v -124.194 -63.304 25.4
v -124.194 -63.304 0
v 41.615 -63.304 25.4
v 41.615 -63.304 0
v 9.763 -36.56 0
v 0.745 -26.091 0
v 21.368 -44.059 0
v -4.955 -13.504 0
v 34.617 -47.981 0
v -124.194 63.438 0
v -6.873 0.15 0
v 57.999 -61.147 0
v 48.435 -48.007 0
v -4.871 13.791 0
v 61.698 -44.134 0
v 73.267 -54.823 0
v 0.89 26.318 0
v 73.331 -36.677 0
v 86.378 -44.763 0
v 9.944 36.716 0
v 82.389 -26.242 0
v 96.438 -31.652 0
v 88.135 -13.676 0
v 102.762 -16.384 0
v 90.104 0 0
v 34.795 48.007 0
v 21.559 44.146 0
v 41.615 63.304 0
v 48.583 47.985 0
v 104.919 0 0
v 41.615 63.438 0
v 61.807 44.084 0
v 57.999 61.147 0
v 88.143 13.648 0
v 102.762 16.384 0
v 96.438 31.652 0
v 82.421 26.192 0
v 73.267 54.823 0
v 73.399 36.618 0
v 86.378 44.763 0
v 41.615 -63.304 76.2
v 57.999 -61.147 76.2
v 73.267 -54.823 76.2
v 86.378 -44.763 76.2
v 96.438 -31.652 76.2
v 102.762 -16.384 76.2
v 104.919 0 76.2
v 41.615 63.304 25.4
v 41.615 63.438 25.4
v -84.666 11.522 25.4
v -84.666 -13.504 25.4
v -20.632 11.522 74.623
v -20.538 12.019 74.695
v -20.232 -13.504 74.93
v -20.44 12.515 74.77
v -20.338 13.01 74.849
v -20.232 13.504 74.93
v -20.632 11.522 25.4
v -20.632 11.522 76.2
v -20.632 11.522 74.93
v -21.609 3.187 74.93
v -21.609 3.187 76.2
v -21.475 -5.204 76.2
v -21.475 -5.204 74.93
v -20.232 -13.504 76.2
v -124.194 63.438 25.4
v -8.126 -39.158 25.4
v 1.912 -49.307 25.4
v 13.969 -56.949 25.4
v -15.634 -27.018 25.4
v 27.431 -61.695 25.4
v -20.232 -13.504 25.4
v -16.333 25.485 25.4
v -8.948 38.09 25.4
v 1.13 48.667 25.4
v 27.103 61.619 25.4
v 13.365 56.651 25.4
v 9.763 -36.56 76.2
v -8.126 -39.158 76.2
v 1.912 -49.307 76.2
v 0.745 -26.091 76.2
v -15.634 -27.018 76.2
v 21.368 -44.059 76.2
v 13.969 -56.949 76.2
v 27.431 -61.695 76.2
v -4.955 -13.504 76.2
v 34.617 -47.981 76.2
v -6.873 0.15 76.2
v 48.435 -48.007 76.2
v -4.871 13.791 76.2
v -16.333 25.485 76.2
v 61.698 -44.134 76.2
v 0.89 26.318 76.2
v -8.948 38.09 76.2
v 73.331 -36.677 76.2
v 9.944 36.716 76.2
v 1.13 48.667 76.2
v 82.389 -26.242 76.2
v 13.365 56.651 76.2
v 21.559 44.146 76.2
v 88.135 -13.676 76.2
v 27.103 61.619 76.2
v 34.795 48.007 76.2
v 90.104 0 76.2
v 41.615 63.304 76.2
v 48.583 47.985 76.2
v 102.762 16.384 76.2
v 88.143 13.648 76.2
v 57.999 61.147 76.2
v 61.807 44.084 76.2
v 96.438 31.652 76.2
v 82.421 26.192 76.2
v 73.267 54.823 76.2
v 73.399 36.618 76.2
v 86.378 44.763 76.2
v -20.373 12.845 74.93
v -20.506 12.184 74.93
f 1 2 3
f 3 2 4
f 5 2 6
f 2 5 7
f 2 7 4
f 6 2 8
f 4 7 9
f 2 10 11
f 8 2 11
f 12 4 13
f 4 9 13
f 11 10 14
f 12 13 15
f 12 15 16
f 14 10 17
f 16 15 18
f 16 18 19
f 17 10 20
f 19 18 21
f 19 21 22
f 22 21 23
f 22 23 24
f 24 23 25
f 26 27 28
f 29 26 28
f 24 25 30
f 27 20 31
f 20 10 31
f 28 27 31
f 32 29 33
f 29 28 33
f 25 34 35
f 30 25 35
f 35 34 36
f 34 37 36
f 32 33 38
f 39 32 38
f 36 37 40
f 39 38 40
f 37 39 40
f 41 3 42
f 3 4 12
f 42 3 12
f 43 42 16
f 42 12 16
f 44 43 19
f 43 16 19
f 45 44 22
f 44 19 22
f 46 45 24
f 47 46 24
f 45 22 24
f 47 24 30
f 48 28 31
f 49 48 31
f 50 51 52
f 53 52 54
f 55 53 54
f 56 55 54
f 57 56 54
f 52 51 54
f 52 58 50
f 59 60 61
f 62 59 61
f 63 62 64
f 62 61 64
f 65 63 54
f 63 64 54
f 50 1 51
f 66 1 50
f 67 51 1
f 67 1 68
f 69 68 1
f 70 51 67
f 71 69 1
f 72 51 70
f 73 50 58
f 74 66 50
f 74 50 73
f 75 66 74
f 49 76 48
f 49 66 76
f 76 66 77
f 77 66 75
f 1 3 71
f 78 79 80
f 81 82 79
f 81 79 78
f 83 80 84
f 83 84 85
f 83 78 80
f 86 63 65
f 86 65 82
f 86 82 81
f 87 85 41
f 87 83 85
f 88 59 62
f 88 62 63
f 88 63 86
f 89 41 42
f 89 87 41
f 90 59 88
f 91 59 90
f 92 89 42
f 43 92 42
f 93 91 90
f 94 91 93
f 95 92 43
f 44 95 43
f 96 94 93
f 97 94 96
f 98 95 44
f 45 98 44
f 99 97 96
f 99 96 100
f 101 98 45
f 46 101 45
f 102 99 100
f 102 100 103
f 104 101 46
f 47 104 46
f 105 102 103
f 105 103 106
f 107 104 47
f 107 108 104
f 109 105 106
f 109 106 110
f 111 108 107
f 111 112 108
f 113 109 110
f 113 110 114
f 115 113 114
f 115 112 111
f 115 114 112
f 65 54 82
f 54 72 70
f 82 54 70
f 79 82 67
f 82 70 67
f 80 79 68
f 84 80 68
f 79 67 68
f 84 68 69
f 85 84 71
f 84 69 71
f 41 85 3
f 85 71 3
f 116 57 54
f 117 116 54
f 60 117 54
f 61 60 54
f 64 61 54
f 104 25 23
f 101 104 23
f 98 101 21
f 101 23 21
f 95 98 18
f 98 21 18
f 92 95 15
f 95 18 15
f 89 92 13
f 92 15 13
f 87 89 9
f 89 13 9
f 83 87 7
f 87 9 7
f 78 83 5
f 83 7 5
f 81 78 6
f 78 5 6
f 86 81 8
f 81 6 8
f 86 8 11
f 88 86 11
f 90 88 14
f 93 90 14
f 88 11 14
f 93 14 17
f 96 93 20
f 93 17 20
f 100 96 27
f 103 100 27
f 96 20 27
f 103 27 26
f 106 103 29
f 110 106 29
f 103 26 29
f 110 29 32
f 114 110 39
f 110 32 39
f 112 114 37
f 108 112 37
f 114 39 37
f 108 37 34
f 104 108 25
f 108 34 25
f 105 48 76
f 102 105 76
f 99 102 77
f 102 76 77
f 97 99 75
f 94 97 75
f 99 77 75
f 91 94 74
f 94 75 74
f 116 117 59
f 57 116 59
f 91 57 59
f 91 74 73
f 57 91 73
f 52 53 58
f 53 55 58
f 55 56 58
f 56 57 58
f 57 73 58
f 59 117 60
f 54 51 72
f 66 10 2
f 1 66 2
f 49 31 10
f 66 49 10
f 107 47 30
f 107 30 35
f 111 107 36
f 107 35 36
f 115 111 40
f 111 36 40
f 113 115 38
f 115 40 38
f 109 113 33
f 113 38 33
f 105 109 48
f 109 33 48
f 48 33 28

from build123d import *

# Parameters (mm, degrees)
F1_DEPTH = 76.2
F2_DEPTH = 25.4
F3_DEPTH = 74.93
F5_DEPTH = 76.94354


with BuildPart() as f1:
    # F0 (on Top) → F1 (new body)
    with BuildSketch(Plane.XY):
        with BuildLine():
            ThreePointArc((41.615028, -63.304463), (86.378043, -44.763015), (104.919491, 0))
            ThreePointArc((104.919491, 0), (86.378043, 44.763015), (41.615028, 63.304463))
            ThreePointArc((41.615028, 63.304463), (1.13027, 48.666615), (-20.631962, 11.522469))
            ThreePointArc((-20.631962, 11.522469), (-21.681366, -1.010742), (-20.232328, -13.504057))
            ThreePointArc((-20.232328, -13.504057), (1.912459, -49.306805), (41.615028, -63.304463))
        make_face()
        with BuildLine():
            ThreePointArc((-4.955136, -13.504057), (34.795208, 48.00656), (90.103581, 0))
            ThreePointArc((90.103581, 0), (48.434848, -48.00656), (-4.955136, -13.504057))
        make_face(mode=Mode.SUBTRACT)
    extrude(amount=F1_DEPTH)

    # F0 (on Top) → F2 (join)
    with BuildSketch(Plane.XY):
        with BuildLine():
            ThreePointArc((-20.631962, 11.522469), (1.13027, 48.666615), (41.615028, 63.304463))
            Line((41.615028, 63.304463), (41.615028, 63.438483))
            Line((41.615028, 63.438483), (-124.193631, 63.438483))
            Line((-124.193631, 63.438483), (-124.193631, -63.304463))
            Line((-124.193631, -63.304463), (41.615028, -63.304463))
            ThreePointArc((41.615028, -63.304463), (1.912459, -49.306805), (-20.232328, -13.504057))
            Line((-20.232328, -13.504057), (-84.665962, -13.504057))
            Line((-84.665962, -13.504057), (-84.665962, 11.522469))
            Line((-84.665962, 11.522469), (-20.631962, 11.522469))
        make_face()
    extrude(amount=F2_DEPTH)

    # F0 (on Top) → F3 (join)
    with BuildSketch(Plane.XY):
        with BuildLine():
            ThreePointArc((-20.232328, -13.504057), (-21.681366, -1.010742), (-20.631962, 11.522469))
            Line((-20.631962, 11.522469), (-84.665962, 11.522469))
            Line((-84.665962, 11.522469), (-84.665962, -13.504057))
            Line((-84.665962, -13.504057), (-20.232328, -13.504057))
        make_face()
    extrude(amount=F3_DEPTH)

    # F4 (on face) → F5 (cut, through all)
    with BuildSketch(Plane.XZ.offset(13.504057)):
        Polygon((-84.665962, 25.4), (-20.232328, 74.93), (-84.665962, 74.93), align=None)
    extrude(amount=-F5_DEPTH, mode=Mode.SUBTRACT)


solid = f1.part
